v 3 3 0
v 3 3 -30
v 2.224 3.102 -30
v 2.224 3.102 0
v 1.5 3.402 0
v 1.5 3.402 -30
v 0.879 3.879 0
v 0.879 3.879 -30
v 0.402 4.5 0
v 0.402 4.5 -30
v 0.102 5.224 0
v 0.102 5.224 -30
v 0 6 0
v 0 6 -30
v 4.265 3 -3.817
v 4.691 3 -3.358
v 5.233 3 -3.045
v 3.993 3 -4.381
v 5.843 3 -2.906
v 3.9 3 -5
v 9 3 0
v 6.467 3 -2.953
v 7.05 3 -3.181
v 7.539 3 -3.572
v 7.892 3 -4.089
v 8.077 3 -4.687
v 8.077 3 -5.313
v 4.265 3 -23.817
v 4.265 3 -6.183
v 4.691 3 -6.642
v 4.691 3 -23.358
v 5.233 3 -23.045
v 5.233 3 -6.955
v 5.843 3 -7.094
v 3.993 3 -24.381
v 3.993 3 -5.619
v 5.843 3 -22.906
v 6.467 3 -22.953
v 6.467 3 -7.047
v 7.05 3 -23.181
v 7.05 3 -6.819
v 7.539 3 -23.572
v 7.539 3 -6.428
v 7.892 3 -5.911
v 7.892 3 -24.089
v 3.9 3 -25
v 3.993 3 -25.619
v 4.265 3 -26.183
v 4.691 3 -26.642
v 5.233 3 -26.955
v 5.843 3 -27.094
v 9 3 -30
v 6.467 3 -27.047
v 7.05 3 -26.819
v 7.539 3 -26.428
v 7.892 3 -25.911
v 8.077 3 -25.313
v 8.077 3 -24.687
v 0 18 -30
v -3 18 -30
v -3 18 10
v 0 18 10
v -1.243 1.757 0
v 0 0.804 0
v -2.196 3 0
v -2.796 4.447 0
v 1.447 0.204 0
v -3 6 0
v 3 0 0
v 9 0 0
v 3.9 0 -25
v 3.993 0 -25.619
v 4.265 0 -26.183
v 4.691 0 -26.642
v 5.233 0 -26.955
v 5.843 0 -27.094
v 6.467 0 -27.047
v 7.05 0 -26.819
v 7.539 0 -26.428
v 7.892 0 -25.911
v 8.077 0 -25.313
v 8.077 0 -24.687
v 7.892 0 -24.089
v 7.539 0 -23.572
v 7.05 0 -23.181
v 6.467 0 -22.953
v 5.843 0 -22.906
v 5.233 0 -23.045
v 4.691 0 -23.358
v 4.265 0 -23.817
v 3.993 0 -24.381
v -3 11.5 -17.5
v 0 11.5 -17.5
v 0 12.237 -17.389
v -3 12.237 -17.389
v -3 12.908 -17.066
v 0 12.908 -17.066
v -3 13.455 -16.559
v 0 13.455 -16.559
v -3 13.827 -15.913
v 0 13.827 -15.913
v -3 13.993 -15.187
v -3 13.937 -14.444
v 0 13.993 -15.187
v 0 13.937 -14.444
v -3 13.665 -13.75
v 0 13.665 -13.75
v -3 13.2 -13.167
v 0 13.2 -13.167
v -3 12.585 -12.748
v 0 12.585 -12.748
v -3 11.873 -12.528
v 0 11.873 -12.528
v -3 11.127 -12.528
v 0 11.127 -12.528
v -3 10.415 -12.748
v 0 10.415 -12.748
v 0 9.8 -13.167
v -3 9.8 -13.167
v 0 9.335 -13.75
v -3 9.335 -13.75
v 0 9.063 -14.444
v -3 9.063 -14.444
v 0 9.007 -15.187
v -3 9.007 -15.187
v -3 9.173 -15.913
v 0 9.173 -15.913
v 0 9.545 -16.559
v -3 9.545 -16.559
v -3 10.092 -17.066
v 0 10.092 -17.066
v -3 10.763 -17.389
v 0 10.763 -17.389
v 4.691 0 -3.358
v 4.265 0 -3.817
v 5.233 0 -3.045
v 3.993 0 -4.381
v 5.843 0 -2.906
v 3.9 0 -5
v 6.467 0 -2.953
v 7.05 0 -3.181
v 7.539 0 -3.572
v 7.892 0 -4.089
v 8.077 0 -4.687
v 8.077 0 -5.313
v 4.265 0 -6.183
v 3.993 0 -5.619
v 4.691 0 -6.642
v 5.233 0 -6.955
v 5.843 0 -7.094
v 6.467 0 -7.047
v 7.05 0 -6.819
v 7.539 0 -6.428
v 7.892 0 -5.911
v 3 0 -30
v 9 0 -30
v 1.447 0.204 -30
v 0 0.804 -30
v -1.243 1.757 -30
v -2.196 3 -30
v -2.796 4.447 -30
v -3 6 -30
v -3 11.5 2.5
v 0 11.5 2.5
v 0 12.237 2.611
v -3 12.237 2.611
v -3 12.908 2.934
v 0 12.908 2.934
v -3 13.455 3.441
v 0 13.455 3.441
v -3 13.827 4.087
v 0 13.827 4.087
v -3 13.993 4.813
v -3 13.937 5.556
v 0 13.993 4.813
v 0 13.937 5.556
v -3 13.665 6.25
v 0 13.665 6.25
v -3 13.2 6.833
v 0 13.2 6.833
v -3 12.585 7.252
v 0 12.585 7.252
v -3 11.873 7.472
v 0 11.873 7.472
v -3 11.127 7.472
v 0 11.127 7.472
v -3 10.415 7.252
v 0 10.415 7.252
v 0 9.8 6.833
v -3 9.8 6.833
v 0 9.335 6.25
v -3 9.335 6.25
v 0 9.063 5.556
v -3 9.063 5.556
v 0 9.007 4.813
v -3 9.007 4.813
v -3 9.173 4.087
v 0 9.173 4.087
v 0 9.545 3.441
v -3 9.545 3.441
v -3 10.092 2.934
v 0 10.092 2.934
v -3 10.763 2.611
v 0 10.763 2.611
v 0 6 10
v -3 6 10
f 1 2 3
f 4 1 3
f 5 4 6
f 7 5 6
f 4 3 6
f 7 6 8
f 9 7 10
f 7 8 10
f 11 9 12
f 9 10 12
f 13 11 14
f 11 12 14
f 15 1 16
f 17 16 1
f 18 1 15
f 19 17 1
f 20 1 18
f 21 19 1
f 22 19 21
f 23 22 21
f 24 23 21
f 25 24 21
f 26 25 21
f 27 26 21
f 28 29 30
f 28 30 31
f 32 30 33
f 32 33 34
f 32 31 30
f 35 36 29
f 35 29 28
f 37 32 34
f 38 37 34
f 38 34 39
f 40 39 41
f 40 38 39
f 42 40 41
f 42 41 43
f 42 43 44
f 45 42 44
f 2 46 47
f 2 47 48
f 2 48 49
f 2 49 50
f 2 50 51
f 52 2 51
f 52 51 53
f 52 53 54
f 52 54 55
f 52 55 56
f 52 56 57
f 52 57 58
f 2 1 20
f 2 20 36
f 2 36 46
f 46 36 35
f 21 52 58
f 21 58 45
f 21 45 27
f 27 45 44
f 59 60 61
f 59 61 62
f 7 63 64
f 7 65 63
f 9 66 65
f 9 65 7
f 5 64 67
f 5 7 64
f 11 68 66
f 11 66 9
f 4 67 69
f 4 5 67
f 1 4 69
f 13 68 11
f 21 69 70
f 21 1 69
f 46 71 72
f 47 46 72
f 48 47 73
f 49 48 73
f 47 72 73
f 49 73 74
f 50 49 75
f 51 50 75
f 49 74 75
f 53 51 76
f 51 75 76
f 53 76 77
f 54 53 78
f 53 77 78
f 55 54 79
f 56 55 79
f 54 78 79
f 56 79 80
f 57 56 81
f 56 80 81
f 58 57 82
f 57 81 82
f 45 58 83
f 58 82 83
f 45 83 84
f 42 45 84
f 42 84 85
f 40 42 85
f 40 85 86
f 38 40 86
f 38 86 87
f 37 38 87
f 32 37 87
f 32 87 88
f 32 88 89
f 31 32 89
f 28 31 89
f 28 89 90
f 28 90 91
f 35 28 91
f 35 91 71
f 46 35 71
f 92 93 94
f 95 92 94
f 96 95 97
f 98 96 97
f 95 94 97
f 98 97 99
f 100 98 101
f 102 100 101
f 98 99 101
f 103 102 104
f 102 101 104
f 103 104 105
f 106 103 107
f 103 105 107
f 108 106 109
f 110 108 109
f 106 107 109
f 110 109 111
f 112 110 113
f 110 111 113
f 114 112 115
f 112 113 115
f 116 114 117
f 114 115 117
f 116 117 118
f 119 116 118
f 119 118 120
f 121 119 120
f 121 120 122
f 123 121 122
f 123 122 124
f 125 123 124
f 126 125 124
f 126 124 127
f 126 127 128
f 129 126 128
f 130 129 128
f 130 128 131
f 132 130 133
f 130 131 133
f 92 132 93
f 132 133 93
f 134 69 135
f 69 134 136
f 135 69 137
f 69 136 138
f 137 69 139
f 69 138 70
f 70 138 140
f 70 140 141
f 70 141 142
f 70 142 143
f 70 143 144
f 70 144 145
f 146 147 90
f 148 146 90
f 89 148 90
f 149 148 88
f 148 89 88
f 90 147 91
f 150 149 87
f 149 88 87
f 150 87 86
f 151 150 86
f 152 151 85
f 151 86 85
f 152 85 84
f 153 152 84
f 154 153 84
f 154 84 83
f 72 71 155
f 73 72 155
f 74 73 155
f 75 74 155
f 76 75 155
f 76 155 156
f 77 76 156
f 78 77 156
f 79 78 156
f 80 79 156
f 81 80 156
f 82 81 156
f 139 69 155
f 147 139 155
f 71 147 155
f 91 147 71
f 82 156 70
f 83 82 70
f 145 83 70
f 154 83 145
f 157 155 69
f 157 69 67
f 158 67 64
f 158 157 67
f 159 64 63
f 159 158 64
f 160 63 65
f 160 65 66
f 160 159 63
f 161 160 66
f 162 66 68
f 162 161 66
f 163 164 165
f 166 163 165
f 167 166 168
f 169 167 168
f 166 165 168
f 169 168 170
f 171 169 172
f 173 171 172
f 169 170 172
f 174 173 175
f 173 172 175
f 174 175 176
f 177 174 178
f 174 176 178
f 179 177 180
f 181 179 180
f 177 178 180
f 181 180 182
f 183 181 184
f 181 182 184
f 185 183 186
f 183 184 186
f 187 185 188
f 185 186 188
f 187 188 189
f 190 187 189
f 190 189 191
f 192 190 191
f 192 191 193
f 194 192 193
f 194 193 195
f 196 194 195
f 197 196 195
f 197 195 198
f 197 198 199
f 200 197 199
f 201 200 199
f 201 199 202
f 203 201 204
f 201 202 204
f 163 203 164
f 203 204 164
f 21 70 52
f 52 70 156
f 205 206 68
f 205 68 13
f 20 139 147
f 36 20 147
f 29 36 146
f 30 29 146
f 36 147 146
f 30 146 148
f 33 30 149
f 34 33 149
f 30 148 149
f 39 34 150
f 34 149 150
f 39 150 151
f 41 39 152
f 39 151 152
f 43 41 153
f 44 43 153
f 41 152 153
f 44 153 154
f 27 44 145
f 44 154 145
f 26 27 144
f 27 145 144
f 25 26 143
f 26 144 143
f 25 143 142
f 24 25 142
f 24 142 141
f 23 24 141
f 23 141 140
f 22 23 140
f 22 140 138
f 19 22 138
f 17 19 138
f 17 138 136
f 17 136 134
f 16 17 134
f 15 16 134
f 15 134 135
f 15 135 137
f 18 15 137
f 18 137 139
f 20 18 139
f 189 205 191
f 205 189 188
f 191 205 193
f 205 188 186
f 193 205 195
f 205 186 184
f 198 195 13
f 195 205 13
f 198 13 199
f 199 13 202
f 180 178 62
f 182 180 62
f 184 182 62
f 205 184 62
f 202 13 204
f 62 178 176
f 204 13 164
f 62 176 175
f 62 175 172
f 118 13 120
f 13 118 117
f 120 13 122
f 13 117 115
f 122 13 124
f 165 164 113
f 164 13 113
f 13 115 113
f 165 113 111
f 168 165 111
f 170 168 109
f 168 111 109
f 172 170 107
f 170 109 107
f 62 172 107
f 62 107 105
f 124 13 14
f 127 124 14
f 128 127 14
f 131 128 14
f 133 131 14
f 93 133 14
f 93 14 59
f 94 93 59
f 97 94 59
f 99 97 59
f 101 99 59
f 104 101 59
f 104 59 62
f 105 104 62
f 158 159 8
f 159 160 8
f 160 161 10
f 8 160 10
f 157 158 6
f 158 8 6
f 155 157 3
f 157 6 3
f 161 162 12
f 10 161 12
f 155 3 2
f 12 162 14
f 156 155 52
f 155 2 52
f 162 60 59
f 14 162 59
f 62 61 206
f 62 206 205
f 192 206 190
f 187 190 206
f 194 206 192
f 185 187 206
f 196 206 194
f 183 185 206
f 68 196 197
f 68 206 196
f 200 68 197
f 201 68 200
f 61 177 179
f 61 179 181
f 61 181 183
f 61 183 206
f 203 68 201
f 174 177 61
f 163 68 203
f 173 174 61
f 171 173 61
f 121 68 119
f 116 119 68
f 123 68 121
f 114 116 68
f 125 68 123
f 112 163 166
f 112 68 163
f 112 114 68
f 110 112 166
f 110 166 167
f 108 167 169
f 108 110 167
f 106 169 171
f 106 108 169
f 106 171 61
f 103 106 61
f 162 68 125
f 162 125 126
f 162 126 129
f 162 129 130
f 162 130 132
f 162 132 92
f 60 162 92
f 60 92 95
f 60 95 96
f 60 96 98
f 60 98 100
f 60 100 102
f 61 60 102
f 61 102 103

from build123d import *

# Parameters (mm, degrees)
SKETCH2_W              = 9
SKETCH2_H              = 30
BOSS_EXTRUDE1_DEPTH    = 3
M5X0_8_TAPPED_HOLE1_D  = 4.2
SKETCH6_W              = 3
SKETCH6_H              = 30
BOSS_EXTRUDE2_DEPTH    = 18
CONVERT_SOLID5_START   = -30
CONVERT_SOLID5_DEPTH   = 30
CONVERT_SOLID5_2_DEPTH = 30
SKETCH24_W             = 3
SKETCH24_H             = 12
BOSS_EXTRUDE3_DEPTH    = 10
SKETCH21_R             = 2.5
CUT_EXTRUDE1_DEPTH     = 3


# Read off the part's stored shape, not the designer's step: Convert-Solid5
with BuildPart() as part:
    # Sketch2 → Boss-Extrude1 (new body)
    with BuildSketch(Plane(origin=(0, 0, 0), x_dir=(1, 0, 0), z_dir=(0, 1, 0))):
        with Locations((4.5, 15)):
            Rectangle(SKETCH2_W, SKETCH2_H)
    extrude(amount=BOSS_EXTRUDE1_DEPTH)

    # M5x0.8 Tapped Hole1 (through all)
    with Locations(Plane(origin=(0, 3, 0), x_dir=(1, 0, 0), z_dir=(0, 1, 0))):
        with Locations((6, 25), (6, 5)):
            Hole(M5X0_8_TAPPED_HOLE1_D / 2)

    # Sketch6 → Boss-Extrude2 (add)
    with BuildSketch(Plane(origin=(0, 0, 0), x_dir=(1, 0, 0), z_dir=(0, 1, 0))):
        with Locations((-1.5, 15)):
            Rectangle(SKETCH6_W, SKETCH6_H)
    extrude(amount=BOSS_EXTRUDE2_DEPTH)

    # Convert-Solid5 outline → Convert-Solid5 (cut)
    with BuildSketch(Plane.XY.offset(CONVERT_SOLID5_START)):
        with BuildLine():
            Line((-3, 0), (3, 0))
            ThreePointArc((3, 0), (-1.242640687, 1.757359313), (-3, 6))
            Line((-3, 6), (-3, 0))
        make_face()
    extrude(amount=CONVERT_SOLID5_DEPTH, mode=Mode.SUBTRACT)

    # Convert-Solid5 2 outline → Convert-Solid5 2 (add)
    with BuildSketch(Plane.XY.offset(CONVERT_SOLID5_START)):
        with BuildLine():
            Line((0, 3), (3, 3))
            ThreePointArc((3, 3), (0.878679656, 3.878679656), (0, 6))
            Line((0, 6), (0, 3))
        make_face()
    extrude(amount=CONVERT_SOLID5_2_DEPTH)

    # Sketch24 → Boss-Extrude3 (add)
    with BuildSketch(Plane.XY):
        with Locations((-1.5, 12)):
            Rectangle(SKETCH24_W, SKETCH24_H)
    extrude(amount=BOSS_EXTRUDE3_DEPTH)

    # Sketch21 → Cut-Extrude1 (cut)
    with BuildSketch(Plane(origin=(0, 0, 0), x_dir=(0, 0, -1), z_dir=(1, 0, 0))):
        with Locations((-5, 11.5)):
            Circle(SKETCH21_R)
        with Locations((15, 11.5)):
            Circle(SKETCH21_R)
    extrude(amount=-CUT_EXTRUDE1_DEPTH, mode=Mode.SUBTRACT)


solid = part.part
